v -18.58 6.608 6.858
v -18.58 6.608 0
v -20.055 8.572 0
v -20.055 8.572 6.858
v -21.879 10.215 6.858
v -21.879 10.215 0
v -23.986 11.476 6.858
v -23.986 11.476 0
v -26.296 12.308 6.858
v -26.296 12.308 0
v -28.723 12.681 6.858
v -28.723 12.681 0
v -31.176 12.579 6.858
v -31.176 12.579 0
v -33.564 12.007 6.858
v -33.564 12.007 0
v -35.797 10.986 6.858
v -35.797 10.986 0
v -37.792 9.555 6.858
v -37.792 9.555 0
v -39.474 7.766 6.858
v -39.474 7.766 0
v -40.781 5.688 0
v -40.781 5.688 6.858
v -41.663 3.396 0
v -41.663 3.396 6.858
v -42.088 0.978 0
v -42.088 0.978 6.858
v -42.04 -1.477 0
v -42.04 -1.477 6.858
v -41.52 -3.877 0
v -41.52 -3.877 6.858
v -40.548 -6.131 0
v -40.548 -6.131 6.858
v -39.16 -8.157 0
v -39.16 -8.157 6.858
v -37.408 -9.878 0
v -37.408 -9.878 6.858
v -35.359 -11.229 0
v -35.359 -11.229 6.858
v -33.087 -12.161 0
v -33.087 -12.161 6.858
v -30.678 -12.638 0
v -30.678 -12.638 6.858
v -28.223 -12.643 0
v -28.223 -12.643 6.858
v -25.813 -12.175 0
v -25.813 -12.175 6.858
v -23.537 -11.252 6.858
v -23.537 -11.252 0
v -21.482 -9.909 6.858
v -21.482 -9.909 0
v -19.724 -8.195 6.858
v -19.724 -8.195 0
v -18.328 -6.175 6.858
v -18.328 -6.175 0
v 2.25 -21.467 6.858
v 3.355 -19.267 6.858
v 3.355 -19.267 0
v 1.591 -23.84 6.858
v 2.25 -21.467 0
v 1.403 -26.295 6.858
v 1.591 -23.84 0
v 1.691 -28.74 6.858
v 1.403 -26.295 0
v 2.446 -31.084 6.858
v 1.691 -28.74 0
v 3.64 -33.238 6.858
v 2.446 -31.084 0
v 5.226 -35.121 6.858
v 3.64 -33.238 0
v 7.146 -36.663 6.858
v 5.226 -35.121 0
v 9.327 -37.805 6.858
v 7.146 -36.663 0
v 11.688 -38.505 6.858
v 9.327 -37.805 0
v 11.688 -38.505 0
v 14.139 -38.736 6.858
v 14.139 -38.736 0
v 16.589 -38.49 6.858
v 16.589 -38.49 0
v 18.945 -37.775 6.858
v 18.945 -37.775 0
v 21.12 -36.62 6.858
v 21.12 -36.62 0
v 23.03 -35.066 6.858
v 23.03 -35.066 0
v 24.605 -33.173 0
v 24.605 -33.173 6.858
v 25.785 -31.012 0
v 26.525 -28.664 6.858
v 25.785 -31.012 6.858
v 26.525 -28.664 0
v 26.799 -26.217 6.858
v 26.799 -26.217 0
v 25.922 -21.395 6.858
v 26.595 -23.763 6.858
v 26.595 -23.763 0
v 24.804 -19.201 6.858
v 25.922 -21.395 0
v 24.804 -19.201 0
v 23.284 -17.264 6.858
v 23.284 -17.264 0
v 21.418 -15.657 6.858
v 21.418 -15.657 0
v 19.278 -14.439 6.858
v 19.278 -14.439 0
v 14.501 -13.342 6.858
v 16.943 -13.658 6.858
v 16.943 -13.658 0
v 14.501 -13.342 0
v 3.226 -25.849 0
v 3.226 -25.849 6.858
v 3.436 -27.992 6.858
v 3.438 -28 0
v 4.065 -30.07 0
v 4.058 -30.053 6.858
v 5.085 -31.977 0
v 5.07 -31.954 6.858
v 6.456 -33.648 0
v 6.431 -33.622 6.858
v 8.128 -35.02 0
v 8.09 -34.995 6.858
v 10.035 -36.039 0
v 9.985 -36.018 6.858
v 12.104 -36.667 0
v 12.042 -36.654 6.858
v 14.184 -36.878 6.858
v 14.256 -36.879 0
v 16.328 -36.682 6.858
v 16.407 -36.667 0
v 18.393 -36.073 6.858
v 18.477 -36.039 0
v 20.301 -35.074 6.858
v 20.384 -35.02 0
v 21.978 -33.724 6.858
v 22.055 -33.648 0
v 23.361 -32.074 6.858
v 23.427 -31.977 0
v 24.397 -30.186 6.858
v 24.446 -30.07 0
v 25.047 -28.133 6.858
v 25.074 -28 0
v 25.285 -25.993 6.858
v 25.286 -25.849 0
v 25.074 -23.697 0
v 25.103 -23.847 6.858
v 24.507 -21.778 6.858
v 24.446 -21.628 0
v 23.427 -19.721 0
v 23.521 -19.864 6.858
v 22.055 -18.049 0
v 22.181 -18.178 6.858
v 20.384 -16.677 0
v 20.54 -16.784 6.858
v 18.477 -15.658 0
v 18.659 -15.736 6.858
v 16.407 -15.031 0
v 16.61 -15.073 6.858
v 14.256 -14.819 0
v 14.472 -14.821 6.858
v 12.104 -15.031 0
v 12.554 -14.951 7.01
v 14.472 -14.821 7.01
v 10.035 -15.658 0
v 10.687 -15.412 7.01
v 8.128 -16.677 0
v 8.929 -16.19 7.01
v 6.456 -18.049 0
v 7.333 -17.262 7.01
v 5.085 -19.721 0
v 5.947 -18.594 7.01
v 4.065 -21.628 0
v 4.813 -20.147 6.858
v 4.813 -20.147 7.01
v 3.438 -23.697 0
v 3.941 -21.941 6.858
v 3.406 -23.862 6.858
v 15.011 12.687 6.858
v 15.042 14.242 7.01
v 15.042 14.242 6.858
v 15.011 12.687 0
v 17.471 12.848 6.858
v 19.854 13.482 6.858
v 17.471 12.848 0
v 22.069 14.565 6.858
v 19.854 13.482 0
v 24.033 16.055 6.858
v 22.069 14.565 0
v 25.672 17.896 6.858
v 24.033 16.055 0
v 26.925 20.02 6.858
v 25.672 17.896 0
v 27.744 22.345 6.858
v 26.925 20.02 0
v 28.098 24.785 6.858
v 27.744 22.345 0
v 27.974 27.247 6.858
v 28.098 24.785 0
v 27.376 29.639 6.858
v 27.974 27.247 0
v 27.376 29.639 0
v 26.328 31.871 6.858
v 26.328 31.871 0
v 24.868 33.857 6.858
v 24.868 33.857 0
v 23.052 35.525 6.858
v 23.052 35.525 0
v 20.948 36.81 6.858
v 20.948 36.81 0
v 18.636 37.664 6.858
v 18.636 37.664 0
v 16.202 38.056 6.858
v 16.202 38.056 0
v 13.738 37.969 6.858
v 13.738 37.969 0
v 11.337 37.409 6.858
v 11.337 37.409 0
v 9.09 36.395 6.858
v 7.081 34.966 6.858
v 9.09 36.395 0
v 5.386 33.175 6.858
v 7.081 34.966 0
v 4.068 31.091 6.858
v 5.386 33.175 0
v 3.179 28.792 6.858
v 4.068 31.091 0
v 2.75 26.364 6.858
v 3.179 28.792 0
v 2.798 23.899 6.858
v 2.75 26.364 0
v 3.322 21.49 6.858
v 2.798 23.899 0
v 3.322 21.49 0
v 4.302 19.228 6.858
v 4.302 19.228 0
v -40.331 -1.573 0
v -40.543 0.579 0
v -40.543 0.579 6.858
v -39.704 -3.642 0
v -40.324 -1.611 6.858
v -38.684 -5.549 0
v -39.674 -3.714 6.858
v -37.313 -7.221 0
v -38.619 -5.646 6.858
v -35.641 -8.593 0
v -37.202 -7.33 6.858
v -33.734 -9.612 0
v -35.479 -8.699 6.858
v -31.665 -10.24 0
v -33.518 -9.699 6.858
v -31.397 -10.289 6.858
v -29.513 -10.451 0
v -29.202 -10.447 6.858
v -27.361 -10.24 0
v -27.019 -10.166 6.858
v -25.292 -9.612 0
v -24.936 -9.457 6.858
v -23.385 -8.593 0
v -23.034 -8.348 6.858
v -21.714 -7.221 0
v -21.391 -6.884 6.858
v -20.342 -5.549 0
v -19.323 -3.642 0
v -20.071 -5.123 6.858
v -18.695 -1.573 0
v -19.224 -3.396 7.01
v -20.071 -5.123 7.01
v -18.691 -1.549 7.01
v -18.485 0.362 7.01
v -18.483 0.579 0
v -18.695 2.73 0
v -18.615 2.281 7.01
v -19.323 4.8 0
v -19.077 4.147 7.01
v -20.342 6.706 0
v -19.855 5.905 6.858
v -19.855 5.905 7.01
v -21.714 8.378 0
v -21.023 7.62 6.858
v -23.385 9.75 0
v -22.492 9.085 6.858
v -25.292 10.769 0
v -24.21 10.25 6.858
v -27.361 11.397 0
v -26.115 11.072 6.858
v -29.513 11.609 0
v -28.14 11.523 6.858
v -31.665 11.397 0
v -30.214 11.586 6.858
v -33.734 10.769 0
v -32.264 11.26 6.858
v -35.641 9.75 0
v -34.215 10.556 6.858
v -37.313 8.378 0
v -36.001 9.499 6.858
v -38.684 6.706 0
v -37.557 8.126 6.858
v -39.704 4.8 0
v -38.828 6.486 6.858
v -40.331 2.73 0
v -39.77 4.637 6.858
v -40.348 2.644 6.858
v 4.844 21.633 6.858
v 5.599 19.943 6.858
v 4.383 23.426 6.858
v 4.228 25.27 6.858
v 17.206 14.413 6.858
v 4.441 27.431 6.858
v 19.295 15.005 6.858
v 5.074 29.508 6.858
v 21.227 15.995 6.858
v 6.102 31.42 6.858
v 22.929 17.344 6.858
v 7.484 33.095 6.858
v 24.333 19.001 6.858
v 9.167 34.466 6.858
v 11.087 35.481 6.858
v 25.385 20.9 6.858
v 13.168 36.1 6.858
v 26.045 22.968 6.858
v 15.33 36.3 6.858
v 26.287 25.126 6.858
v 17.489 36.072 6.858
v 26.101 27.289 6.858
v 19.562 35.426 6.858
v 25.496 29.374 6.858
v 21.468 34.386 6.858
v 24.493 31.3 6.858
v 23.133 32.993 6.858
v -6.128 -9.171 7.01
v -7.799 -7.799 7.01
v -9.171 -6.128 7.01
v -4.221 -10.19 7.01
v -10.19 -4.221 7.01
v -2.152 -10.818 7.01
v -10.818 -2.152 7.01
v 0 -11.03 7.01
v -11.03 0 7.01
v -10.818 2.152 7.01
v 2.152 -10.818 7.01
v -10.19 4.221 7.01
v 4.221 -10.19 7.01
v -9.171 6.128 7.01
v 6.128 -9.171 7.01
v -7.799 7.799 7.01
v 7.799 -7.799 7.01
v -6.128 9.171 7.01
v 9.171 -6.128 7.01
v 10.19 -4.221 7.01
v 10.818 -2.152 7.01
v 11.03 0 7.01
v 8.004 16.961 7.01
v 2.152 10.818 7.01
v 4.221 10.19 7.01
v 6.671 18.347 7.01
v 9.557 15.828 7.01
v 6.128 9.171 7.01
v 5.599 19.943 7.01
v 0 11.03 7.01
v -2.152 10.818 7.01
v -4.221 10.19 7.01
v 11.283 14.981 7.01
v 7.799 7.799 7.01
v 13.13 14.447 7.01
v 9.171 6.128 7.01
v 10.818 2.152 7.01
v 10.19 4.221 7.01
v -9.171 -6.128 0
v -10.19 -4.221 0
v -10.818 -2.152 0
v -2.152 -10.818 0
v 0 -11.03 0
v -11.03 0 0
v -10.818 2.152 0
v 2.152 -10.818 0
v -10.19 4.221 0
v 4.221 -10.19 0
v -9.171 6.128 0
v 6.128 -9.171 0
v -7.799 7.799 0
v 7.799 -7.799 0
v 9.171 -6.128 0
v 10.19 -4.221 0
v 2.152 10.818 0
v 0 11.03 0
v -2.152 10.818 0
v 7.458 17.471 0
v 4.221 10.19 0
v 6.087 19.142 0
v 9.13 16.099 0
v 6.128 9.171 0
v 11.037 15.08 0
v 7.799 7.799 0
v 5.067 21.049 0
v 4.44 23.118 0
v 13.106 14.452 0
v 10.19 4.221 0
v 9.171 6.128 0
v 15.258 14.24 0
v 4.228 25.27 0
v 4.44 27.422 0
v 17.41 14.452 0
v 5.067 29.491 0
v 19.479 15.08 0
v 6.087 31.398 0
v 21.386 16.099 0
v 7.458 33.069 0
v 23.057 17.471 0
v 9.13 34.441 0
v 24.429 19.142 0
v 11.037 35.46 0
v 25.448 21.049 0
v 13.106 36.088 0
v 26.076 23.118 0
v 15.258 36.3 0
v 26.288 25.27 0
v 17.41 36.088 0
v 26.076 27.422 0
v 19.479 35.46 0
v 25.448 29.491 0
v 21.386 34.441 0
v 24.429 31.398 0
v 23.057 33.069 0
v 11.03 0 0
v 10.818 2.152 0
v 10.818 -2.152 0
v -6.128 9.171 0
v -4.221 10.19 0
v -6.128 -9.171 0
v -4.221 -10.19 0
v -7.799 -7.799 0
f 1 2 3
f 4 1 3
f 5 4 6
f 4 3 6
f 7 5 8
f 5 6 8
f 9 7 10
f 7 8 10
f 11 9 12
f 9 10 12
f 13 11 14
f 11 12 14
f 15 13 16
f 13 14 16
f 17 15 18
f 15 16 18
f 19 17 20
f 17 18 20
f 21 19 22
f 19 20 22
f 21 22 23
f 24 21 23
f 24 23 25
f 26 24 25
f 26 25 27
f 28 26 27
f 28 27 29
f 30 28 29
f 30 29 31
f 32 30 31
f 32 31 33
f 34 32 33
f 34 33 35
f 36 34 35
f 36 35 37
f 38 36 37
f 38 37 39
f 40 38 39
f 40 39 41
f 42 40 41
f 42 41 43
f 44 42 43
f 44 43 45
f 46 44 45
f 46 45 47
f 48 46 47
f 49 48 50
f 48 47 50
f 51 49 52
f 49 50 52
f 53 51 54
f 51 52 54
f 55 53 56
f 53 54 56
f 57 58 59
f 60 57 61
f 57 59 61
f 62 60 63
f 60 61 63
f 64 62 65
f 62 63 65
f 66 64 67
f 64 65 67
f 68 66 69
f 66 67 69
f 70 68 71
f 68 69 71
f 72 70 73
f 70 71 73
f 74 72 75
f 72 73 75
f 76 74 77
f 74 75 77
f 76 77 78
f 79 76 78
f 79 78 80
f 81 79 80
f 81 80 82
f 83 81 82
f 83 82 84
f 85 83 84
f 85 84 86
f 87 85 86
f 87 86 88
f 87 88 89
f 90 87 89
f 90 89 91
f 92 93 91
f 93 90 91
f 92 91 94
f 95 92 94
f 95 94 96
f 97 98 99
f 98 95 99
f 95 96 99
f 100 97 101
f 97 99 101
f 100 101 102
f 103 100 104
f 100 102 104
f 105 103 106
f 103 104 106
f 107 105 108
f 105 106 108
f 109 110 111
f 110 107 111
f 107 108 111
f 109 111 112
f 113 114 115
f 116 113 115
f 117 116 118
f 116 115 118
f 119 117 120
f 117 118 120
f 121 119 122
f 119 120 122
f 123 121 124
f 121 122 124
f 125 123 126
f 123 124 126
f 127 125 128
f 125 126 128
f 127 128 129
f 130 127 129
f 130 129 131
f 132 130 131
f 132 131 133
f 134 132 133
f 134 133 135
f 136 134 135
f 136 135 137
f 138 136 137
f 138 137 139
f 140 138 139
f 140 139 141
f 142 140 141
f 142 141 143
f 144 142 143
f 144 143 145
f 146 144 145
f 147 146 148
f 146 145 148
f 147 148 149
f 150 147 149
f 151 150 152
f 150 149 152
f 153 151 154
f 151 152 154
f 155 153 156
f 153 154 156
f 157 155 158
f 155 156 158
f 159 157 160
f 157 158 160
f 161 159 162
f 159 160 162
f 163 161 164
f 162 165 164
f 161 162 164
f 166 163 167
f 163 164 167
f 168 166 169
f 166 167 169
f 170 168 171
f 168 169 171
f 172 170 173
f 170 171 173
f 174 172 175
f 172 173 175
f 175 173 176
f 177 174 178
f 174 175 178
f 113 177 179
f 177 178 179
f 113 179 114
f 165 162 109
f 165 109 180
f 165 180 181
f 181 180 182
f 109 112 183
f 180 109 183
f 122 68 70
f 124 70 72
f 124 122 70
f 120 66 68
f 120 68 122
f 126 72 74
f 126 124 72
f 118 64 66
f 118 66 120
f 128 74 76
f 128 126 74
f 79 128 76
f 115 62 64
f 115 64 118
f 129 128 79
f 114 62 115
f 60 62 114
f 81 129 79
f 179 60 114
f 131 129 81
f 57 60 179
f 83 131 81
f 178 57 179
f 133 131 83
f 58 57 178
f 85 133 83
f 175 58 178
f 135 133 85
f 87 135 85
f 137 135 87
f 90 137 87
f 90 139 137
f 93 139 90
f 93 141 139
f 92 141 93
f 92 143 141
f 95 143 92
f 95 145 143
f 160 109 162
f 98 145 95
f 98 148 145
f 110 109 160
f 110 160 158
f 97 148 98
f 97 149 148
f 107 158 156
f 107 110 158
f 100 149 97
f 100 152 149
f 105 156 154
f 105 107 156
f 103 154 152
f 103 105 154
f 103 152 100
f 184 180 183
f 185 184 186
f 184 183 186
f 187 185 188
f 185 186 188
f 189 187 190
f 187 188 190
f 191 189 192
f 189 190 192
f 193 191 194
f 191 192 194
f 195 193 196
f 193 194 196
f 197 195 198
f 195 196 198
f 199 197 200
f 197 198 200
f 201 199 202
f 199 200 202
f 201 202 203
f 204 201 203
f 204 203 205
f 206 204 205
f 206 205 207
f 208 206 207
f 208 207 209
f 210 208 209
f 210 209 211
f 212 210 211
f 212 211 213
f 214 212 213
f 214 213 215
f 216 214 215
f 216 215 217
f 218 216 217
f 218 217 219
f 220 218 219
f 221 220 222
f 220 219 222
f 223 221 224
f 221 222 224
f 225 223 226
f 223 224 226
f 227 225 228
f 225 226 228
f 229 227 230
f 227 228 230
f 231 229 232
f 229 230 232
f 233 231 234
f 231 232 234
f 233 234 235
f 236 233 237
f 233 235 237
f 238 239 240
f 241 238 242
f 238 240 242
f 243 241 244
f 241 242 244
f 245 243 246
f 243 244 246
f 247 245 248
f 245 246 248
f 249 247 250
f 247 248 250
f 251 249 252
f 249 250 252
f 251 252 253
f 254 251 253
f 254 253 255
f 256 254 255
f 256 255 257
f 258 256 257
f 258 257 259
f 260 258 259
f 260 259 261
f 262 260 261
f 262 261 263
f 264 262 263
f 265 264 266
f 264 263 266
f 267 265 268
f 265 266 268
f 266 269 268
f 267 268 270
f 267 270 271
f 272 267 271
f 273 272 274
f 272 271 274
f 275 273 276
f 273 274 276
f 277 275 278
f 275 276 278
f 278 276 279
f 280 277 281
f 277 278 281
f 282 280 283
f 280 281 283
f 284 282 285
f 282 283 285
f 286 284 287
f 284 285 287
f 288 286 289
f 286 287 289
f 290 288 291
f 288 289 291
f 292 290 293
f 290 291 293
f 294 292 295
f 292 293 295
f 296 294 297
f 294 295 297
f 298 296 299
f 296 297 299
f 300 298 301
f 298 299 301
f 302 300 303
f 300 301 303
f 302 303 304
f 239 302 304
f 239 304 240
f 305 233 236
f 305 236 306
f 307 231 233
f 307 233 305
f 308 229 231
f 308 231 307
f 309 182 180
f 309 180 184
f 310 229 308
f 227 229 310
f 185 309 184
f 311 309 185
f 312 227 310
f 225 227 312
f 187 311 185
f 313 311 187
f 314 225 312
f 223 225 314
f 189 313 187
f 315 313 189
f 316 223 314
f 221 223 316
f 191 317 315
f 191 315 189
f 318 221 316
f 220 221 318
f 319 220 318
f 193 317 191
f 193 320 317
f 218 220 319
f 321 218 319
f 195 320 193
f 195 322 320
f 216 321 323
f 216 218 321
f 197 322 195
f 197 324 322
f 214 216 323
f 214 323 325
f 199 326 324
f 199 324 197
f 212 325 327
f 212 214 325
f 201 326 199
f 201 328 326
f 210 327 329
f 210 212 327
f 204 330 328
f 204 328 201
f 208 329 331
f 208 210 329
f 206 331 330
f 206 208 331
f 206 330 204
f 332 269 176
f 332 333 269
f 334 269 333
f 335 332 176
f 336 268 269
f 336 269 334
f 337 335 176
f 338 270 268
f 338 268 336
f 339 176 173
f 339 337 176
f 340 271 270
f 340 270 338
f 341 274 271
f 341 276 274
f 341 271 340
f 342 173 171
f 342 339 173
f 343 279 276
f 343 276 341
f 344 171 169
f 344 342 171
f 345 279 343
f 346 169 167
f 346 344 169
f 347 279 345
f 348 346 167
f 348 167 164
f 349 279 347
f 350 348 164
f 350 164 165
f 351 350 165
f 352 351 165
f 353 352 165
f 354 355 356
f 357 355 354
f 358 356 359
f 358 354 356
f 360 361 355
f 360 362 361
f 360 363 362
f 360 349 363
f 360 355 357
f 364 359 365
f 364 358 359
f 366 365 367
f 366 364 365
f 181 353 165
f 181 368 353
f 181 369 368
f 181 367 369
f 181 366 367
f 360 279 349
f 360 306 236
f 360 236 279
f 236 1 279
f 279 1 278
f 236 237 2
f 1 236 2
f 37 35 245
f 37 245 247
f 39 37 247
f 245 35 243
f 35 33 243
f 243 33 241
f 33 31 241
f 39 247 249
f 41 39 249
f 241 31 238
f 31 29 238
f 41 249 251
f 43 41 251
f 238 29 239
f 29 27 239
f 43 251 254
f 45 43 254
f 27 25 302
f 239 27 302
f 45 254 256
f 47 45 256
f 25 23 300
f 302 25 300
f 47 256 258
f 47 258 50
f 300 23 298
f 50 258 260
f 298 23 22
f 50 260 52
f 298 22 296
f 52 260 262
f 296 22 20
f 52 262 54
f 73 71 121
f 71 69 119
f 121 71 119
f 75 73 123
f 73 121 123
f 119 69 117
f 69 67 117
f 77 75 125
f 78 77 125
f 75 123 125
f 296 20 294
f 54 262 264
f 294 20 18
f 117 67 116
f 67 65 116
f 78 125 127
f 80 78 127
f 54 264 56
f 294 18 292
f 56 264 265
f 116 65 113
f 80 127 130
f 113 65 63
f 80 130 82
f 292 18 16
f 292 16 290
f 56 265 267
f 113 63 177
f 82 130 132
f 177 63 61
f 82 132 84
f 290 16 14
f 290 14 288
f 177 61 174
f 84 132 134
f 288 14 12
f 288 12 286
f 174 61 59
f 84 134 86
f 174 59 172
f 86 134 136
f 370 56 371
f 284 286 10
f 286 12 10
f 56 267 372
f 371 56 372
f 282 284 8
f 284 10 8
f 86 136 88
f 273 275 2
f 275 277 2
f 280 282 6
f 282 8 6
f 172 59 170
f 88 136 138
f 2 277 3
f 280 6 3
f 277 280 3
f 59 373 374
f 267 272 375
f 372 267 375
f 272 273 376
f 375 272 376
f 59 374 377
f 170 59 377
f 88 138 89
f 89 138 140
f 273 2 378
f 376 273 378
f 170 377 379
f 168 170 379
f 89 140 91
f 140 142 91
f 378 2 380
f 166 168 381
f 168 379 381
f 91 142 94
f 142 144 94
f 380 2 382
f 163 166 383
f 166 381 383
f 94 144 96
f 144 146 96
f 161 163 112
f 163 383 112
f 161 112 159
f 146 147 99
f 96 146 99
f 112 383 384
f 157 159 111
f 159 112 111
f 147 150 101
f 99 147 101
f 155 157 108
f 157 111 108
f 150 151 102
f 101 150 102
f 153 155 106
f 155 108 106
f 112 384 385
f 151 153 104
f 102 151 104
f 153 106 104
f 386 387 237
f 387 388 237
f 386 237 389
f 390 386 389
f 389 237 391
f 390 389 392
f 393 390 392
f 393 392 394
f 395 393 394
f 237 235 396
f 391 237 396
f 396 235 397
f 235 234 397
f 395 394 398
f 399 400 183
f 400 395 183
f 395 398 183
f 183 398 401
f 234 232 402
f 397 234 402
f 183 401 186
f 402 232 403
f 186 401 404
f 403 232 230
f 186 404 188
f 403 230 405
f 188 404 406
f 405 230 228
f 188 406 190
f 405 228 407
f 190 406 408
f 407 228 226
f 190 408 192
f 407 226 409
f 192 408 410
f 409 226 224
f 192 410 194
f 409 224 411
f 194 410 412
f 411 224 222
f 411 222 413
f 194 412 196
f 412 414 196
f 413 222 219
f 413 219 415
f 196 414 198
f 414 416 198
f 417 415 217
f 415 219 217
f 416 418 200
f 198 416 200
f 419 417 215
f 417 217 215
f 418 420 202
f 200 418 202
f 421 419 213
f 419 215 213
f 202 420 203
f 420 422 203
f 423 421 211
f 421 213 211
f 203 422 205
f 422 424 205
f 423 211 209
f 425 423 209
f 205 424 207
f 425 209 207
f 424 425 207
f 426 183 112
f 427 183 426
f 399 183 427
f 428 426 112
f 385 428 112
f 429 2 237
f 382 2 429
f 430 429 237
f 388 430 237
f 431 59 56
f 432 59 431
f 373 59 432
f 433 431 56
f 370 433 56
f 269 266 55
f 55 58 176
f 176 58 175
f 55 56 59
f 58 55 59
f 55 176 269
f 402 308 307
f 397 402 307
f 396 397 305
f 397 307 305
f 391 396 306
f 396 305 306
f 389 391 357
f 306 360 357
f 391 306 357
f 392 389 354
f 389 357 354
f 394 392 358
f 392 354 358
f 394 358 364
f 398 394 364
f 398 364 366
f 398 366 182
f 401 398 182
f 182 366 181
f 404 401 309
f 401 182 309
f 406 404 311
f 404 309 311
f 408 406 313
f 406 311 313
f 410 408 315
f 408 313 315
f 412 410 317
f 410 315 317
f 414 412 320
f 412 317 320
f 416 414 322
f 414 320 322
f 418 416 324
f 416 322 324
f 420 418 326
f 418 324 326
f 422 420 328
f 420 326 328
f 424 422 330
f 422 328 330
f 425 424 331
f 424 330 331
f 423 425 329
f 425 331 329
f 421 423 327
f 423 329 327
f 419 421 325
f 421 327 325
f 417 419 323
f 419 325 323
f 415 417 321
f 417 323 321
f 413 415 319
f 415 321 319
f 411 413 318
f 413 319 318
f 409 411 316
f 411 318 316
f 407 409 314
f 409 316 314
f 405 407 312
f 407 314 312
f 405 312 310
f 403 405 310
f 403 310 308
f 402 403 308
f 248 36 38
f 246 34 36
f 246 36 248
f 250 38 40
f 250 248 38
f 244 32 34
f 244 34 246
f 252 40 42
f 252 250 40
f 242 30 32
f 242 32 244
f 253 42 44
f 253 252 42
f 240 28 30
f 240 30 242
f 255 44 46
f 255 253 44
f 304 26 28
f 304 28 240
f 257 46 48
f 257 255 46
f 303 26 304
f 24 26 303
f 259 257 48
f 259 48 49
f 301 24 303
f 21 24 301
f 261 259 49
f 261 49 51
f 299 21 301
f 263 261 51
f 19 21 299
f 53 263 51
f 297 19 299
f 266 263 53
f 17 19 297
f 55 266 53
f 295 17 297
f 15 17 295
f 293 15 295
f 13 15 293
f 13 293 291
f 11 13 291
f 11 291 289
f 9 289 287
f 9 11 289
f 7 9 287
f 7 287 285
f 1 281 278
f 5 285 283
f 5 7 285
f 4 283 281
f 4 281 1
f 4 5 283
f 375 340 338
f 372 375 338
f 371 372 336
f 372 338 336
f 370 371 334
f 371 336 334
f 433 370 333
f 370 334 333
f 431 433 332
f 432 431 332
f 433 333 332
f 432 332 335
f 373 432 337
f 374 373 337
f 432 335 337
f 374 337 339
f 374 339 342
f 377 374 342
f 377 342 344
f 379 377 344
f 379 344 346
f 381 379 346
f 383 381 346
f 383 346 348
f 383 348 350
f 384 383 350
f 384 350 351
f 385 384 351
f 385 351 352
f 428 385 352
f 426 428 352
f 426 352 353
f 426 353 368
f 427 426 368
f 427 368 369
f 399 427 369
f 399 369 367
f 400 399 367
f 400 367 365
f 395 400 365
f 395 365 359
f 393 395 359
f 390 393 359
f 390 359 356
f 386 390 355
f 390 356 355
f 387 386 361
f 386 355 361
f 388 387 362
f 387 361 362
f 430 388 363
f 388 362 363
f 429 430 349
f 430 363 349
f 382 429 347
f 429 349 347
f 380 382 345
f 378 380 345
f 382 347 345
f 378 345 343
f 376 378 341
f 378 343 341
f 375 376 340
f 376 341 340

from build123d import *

# Parameters (mm, degrees)
F1_DEPTH = 7.0104
F2_D     = 22.060000076
F3_R     = 12.7
F4_DEPTH = 6.858
F5_R     = 12.7
F6_DEPTH = 6.858
F7_R     = 12.7
F8_DEPTH = 6.858
F9_D     = 22.060000076
F10_D    = 22.060000076
F11_D    = 22.060000076


with BuildPart() as f1:
    # F0 (on Top) → F1 (new body)
    with BuildSketch(Plane.XY):
        Polygon((15.2576936839, 25.2700417553), (-29.5133449568, 0.5785294558), (14.2556512728, -25.8485712111), align=None)
    extrude(amount=F1_DEPTH)

    # F2 (through all)
    with Locations(Plane(origin=(0, 0, 0), x_dir=(1, 0, 0), z_dir=(0, 0, -1))):
        with Locations((0, 0)):
            Hole(F2_D / 2)

    # F3 (on Top) → F4 (join)
    with BuildSketch(Plane.XY):
        with Locations((14.1001231968, -26.0360408574)):
            Circle(F3_R)
    extrude(amount=F4_DEPTH)

    # F5 (on Top) → F6 (join)
    with BuildSketch(Plane.XY):
        with Locations((15.4117625207, 25.3802221268)):
            Circle(F5_R)
    extrude(amount=F6_DEPTH)

    # F7 (on Top) → F8 (join)
    with BuildSketch(Plane.XY):
        with Locations((-29.4258532214, 0)):
            Circle(F7_R)
    extrude(amount=F8_DEPTH)

    # F9 (through all)
    with Locations(Plane(origin=(0, 0, 0), x_dir=(1, 0, 0), z_dir=(0, 0, -1))):
        with Locations((15.2576936839, -25.2700417553)):
            Hole(F9_D / 2)

    # F10 (through all)
    with Locations(Plane(origin=(0, 0, 0), x_dir=(1, 0, 0), z_dir=(0, 0, -1))):
        with Locations((14.2556512728, 25.8485712111)):
            Hole(F10_D / 2)

    # F11 (through all)
    with Locations(Plane(origin=(0, 0, 0), x_dir=(1, 0, 0), z_dir=(0, 0, -1))):
        with Locations((-29.5133449568, -0.5785294558)):
            Hole(F11_D / 2)


solid = f1.part
